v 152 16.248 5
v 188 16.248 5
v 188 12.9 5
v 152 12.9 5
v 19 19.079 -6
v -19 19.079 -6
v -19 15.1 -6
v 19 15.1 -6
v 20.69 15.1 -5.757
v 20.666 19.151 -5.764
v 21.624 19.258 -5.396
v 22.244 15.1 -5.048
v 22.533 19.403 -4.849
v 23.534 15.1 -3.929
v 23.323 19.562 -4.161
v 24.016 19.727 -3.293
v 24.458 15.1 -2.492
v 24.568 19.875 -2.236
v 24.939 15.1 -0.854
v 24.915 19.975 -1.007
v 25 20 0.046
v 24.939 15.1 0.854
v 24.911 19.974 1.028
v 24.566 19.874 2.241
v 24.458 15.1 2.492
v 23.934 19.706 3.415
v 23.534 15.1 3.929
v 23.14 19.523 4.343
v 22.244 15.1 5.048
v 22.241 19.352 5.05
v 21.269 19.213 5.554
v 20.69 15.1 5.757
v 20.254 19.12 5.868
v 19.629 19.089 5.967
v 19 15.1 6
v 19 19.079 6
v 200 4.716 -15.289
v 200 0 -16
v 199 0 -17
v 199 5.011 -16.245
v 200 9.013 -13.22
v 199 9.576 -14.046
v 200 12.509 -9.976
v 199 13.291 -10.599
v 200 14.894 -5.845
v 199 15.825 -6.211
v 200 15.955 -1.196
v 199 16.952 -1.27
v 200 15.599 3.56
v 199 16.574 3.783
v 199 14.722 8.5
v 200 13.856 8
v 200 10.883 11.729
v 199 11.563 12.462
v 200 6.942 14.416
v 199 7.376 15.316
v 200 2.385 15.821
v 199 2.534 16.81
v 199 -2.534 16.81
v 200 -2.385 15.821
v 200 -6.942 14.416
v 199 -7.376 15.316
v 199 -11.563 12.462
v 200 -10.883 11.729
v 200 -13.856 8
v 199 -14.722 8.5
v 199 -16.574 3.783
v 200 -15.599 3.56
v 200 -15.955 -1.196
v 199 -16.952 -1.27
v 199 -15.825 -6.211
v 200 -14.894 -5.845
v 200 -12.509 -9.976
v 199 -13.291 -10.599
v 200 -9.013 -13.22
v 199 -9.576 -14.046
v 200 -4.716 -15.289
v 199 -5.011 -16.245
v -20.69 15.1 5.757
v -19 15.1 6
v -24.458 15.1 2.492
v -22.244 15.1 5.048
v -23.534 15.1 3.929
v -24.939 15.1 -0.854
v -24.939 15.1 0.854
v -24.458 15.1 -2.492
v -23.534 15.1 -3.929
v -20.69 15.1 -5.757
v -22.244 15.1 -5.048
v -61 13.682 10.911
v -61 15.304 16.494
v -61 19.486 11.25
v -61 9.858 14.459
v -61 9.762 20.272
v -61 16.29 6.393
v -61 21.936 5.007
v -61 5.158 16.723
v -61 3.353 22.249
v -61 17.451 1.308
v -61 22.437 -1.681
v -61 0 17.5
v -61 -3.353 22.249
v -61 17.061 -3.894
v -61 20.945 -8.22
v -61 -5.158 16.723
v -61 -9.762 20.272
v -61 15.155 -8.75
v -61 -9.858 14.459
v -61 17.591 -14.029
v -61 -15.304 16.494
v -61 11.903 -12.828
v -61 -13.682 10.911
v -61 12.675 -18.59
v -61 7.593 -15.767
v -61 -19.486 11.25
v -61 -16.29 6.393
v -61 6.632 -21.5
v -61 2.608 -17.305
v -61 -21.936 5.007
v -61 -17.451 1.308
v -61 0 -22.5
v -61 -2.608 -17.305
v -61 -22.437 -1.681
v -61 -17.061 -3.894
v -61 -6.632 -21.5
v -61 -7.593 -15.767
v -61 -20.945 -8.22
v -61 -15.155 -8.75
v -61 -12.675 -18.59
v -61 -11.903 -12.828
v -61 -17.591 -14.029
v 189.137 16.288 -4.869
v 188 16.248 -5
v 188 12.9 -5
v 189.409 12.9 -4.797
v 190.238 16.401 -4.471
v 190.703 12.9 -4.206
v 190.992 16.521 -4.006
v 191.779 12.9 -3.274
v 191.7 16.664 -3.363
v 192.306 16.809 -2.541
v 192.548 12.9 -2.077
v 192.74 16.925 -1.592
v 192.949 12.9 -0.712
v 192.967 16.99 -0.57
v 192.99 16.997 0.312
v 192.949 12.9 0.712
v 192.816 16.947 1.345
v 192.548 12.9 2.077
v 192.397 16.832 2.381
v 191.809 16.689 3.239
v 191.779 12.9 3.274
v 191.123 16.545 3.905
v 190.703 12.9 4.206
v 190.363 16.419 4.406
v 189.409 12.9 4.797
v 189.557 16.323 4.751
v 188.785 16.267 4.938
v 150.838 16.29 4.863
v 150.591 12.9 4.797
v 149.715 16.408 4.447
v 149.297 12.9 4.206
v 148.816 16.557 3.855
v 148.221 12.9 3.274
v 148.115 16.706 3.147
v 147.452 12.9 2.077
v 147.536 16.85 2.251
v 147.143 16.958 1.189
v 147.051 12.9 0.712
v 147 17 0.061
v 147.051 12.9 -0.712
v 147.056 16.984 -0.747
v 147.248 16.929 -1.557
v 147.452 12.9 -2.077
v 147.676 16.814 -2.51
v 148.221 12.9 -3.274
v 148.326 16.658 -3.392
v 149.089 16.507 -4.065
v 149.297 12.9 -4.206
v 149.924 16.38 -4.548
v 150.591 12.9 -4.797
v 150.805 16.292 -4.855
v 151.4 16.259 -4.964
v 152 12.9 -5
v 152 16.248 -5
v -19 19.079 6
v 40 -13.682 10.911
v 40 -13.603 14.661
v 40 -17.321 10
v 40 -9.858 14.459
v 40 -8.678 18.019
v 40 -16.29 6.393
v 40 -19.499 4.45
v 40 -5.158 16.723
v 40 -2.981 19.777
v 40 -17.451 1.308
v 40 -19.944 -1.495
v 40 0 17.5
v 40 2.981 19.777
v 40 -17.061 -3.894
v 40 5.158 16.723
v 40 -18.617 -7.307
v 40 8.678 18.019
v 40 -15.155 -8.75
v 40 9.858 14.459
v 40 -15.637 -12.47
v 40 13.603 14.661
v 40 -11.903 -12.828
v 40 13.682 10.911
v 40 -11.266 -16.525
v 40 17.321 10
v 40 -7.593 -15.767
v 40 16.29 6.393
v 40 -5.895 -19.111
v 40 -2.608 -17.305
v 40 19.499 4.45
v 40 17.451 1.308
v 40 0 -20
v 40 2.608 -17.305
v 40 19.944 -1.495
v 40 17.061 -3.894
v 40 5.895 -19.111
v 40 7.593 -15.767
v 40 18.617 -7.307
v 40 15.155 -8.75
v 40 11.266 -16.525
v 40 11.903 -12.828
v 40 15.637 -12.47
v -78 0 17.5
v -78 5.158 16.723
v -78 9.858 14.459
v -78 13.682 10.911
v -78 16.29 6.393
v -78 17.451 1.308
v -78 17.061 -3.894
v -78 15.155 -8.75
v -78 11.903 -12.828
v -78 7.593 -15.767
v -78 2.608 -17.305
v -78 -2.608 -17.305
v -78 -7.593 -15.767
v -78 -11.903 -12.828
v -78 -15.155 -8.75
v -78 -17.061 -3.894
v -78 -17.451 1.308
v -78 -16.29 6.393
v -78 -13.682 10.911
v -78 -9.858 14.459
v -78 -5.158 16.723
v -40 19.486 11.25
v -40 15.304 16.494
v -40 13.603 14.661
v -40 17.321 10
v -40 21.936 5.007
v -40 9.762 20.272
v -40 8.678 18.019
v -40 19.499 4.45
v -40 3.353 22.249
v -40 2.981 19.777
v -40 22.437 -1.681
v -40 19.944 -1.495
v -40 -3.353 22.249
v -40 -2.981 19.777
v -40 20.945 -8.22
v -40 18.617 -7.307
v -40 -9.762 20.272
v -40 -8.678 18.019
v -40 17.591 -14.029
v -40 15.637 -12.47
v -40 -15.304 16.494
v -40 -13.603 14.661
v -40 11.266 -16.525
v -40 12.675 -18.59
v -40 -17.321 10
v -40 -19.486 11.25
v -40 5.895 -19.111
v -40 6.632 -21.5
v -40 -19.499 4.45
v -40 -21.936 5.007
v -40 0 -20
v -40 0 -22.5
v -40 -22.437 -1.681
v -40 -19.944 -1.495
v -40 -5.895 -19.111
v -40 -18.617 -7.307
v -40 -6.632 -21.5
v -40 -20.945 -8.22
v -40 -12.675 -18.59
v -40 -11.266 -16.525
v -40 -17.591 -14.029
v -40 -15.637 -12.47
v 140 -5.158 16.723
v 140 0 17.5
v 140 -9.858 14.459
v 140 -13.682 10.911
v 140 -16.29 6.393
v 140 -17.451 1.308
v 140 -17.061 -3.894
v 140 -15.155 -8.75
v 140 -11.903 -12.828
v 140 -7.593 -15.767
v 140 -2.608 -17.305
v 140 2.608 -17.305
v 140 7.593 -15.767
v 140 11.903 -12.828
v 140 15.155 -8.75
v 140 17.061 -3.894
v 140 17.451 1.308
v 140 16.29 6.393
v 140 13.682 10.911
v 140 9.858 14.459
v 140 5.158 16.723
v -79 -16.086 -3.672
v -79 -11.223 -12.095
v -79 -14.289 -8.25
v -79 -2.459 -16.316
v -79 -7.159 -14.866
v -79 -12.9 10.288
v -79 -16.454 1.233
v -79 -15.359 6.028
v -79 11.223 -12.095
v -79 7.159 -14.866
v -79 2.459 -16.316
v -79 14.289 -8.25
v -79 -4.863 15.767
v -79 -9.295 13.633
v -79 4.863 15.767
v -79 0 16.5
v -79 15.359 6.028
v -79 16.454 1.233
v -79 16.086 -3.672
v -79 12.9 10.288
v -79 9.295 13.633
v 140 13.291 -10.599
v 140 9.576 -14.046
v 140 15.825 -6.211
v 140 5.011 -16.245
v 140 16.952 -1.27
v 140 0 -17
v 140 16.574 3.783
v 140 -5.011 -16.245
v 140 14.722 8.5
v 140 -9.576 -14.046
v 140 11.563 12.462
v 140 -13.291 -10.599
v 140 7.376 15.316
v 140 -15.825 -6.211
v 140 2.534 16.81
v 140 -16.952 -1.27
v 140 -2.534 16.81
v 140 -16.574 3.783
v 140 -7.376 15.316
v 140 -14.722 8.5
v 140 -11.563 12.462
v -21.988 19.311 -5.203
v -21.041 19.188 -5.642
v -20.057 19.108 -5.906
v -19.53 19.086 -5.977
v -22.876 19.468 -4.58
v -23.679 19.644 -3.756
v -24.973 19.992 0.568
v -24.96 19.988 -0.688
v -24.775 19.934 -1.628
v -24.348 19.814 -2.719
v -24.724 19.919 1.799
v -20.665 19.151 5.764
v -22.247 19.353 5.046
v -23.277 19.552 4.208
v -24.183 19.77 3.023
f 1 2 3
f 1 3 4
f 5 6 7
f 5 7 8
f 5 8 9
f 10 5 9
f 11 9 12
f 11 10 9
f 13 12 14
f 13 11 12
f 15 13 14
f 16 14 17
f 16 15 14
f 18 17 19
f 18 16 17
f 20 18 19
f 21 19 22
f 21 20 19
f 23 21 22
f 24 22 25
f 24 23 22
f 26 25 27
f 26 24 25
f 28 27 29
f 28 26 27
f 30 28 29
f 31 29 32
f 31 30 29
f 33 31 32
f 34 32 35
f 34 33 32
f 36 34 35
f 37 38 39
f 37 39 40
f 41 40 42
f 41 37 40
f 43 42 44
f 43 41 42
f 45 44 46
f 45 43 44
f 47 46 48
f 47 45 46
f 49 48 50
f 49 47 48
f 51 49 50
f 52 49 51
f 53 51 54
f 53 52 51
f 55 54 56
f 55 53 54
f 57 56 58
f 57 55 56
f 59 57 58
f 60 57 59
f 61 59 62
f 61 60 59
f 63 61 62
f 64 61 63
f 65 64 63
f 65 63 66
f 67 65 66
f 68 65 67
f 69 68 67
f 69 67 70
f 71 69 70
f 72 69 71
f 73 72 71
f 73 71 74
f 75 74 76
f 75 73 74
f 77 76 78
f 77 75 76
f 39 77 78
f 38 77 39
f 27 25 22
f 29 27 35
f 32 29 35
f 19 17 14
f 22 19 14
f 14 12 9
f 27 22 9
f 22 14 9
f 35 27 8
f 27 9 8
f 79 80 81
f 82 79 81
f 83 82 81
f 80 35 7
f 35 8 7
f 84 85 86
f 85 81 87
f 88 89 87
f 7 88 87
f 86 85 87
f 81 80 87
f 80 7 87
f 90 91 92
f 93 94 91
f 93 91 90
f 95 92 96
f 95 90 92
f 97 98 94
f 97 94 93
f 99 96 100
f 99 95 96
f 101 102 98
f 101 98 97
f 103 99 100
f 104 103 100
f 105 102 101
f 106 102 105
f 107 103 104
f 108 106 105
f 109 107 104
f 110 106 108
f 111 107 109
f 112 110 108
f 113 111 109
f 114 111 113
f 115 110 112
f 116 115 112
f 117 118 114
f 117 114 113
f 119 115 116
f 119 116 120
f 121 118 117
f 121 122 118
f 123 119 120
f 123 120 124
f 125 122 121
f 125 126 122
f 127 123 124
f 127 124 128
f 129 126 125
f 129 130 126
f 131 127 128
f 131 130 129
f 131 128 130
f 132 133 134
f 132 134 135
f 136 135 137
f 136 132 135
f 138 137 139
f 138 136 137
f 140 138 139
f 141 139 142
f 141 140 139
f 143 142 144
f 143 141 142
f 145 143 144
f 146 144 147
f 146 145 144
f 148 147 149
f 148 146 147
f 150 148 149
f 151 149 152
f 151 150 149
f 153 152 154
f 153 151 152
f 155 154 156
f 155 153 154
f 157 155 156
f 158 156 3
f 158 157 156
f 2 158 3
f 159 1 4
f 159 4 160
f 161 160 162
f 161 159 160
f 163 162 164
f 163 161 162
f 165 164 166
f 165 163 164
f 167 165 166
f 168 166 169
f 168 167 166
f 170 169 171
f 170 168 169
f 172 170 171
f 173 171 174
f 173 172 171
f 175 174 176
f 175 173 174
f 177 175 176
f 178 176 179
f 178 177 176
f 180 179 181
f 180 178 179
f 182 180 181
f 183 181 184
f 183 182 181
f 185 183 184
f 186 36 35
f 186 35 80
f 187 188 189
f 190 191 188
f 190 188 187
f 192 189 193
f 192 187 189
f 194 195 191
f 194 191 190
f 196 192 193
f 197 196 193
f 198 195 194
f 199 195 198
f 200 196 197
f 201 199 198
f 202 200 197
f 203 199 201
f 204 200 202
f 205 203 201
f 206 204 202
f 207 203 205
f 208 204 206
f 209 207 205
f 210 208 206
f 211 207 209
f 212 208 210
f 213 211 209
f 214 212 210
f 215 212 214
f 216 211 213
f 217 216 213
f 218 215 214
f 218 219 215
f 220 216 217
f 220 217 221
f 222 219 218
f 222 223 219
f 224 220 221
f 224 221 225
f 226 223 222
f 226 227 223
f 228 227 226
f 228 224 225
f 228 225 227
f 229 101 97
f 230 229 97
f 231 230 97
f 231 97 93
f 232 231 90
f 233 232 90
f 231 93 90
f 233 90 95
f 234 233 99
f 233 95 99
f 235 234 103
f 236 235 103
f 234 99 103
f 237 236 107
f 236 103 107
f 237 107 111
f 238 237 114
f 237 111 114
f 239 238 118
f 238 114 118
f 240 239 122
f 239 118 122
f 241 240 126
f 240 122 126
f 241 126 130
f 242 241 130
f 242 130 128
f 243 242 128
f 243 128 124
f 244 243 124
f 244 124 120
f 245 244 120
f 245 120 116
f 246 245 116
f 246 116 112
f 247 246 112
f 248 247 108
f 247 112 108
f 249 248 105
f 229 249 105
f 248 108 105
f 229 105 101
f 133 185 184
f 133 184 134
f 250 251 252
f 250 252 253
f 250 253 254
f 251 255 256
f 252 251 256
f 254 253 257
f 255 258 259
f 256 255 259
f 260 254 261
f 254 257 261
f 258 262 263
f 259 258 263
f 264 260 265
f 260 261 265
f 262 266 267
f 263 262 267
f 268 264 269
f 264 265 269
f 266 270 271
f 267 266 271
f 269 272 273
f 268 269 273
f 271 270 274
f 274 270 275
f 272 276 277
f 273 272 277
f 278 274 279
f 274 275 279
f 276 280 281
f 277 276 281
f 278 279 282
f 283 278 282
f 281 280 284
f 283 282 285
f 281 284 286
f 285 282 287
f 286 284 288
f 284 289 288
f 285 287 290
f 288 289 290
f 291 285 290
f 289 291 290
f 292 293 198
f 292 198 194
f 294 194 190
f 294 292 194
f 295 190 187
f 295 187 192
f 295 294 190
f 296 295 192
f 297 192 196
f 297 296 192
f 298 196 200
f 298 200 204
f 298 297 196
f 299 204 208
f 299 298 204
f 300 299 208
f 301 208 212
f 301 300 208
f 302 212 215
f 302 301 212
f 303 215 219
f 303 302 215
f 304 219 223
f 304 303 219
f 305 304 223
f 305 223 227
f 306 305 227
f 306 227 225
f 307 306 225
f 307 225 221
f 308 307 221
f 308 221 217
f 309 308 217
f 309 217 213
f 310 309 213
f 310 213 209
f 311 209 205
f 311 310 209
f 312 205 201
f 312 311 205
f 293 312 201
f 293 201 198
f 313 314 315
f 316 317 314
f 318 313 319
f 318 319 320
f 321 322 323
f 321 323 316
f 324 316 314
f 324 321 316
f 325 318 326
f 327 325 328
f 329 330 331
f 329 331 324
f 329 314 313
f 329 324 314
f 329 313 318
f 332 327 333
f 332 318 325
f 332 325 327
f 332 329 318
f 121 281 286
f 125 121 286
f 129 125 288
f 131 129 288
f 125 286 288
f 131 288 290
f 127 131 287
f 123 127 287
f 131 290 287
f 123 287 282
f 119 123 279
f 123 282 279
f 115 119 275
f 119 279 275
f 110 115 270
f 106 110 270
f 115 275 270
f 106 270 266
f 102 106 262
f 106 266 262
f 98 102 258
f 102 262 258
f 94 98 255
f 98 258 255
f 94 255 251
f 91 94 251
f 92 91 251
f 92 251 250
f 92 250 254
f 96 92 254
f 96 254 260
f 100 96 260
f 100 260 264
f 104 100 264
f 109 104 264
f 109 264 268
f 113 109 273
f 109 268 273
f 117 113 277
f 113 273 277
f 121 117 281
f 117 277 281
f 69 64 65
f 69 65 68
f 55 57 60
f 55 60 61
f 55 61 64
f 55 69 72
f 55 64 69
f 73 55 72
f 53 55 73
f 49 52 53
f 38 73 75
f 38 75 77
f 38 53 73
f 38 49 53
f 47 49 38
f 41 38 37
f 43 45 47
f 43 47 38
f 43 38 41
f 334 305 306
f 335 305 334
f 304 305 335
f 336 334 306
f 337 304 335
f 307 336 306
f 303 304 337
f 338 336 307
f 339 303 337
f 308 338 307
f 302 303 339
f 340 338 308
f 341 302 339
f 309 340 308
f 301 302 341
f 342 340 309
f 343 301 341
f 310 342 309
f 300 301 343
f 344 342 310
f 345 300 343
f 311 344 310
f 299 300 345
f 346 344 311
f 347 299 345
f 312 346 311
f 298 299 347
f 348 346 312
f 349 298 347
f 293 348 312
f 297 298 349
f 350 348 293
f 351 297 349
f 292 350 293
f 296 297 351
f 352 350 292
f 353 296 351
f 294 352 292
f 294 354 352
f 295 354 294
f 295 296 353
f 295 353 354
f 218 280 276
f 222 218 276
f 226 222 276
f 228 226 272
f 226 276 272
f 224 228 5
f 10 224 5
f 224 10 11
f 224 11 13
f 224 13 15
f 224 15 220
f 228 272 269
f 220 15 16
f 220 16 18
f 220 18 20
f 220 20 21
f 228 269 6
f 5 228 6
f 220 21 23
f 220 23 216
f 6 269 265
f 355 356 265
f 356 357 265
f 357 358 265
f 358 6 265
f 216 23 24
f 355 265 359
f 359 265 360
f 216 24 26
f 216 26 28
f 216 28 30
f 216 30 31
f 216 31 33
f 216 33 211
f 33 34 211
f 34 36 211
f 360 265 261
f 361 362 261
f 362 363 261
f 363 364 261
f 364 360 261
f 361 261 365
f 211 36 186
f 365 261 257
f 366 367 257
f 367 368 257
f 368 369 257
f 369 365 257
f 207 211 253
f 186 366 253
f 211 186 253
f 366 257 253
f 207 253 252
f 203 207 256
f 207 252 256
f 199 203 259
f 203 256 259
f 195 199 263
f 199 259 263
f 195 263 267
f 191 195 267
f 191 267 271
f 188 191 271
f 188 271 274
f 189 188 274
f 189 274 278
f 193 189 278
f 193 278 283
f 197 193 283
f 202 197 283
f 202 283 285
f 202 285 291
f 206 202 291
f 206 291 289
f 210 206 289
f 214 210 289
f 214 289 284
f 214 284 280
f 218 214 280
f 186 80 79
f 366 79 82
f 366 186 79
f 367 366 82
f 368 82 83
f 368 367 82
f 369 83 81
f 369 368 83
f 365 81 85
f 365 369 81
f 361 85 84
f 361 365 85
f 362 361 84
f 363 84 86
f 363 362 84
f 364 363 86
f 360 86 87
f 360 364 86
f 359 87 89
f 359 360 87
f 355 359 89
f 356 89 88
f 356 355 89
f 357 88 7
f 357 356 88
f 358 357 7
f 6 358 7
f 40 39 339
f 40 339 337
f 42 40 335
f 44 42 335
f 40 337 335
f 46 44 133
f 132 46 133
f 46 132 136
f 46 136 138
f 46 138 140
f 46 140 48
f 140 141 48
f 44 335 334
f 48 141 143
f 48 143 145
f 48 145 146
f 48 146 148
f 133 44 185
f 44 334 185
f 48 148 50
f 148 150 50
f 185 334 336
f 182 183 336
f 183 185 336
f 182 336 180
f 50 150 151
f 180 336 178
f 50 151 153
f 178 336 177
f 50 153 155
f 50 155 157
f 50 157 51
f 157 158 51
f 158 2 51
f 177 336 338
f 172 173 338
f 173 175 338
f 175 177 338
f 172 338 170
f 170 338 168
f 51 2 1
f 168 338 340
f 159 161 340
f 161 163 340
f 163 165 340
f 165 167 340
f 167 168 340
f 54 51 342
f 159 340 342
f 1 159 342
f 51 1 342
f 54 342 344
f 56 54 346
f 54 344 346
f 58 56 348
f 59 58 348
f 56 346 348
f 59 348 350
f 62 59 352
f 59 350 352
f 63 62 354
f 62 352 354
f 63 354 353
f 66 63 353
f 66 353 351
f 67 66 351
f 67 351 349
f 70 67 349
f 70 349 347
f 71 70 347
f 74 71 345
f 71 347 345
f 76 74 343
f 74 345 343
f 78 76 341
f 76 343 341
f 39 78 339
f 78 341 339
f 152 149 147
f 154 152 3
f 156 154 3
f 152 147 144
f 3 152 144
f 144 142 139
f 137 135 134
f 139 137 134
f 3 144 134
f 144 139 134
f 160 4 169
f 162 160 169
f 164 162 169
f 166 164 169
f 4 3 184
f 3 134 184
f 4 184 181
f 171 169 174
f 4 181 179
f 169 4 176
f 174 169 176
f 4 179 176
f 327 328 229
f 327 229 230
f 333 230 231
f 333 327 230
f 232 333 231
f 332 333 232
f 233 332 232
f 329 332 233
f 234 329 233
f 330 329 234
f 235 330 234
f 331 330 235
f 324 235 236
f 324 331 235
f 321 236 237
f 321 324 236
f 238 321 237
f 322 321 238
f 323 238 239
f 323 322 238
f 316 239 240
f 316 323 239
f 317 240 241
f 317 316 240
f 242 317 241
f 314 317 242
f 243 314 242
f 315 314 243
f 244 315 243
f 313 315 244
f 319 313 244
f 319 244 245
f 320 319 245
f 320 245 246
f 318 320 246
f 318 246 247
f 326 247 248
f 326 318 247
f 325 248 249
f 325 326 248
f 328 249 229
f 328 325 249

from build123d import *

# Parameters (mm, degrees)
BOSS_EXTRUDE1_DEPTH      = 40
BOSS_EXTRUDE1_DEPTH_BACK = 40
SKETCH1_R                = 20
CUT_EXTRUDE1_DEPTH       = 4.9
SKETCH3_R                = 22.5
BOSS_EXTRUDE2_DEPTH      = 21
SKETCH4_R                = 17.5
BOSS_EXTRUDE3_DEPTH      = 18
CHAMFER1_SIZE            = 1
BOSS_EXTRUDE4_START      = 100
SKETCH5_R                = 17.5
BOSS_EXTRUDE4_DEPTH      = 100
SKETCH6_R                = 17
BOSS_EXTRUDE5_DEPTH      = 60
CUT_EXTRUDE2_DEPTH       = 4.1
CHAMFER2_SIZE            = 1


with BuildPart() as part:
    # Sketch1 → Boss-Extrude1 (new, two sides: drawn at the far end of the back side and taken through both)
    with BuildSketch(Plane(origin=(0, 0, 0), x_dir=(0, 0, -1), z_dir=(1, 0, 0)).offset(-BOSS_EXTRUDE1_DEPTH_BACK)):
        Circle(SKETCH1_R)
    extrude(amount=BOSS_EXTRUDE1_DEPTH + BOSS_EXTRUDE1_DEPTH_BACK)

    # Sketch2 → Cut-Extrude1 (cut)
    with BuildSketch(Plane(origin=(0, 20, 0), x_dir=(1, 0, 0), z_dir=(0, 1, 0))):
        with BuildLine():
            Line((-19, 6), (19, 6))
            ThreePointArc((19, 6), (25, 0), (19, -6))
            Line((19, -6), (-19, -6))
            ThreePointArc((-19, -6), (-25, 0), (-19, 6))
        make_face()
    extrude(amount=-CUT_EXTRUDE1_DEPTH, mode=Mode.SUBTRACT)

    # Sketch3 → Boss-Extrude2 (add)
    with BuildSketch(Plane.ZY.offset(40)):
        Circle(SKETCH3_R)
    extrude(amount=BOSS_EXTRUDE2_DEPTH)

    # Sketch4 → Boss-Extrude3 (add)
    with BuildSketch(Plane.ZY.offset(61)):
        Circle(SKETCH4_R)
    extrude(amount=BOSS_EXTRUDE3_DEPTH)

    # Chamfer1
    chamfer1_edges = [part.edges().sort_by_distance(p)[0] for p in [
        (-79, 0, -17.5),
    ]]
    chamfer(chamfer1_edges, length=CHAMFER1_SIZE)

    # Sketch5 → Boss-Extrude4 (add)
    with BuildSketch(Plane(origin=(40, 0, 0), x_dir=(0, 0, -1), z_dir=(1, 0, 0)).offset(BOSS_EXTRUDE4_START)):
        Circle(SKETCH5_R)
    extrude(amount=-BOSS_EXTRUDE4_DEPTH)

    # Sketch6 → Boss-Extrude5 (add)
    with BuildSketch(Plane(origin=(140, 0, 0), x_dir=(0, 0, -1), z_dir=(1, 0, 0))):
        Circle(SKETCH6_R)
    extrude(amount=BOSS_EXTRUDE5_DEPTH)

    # Sketch7 → Cut-Extrude2 (cut)
    with BuildSketch(Plane(origin=(0, 17, 0), x_dir=(1, 0, 0), z_dir=(0, 1, 0))):
        with BuildLine():
            Line((152, 5), (188, 5))
            ThreePointArc((188, 5), (193, 0), (188, -5))
            Line((188, -5), (152, -5))
            ThreePointArc((152, -5), (147, 0), (152, 5))
        make_face()
    extrude(amount=-CUT_EXTRUDE2_DEPTH, mode=Mode.SUBTRACT)

    # Chamfer2
    chamfer2_edges = [part.edges().sort_by_distance(p)[0] for p in [
        (200, 0, 17),
    ]]
    chamfer(chamfer2_edges, length=CHAMFER2_SIZE)


solid = part.part
